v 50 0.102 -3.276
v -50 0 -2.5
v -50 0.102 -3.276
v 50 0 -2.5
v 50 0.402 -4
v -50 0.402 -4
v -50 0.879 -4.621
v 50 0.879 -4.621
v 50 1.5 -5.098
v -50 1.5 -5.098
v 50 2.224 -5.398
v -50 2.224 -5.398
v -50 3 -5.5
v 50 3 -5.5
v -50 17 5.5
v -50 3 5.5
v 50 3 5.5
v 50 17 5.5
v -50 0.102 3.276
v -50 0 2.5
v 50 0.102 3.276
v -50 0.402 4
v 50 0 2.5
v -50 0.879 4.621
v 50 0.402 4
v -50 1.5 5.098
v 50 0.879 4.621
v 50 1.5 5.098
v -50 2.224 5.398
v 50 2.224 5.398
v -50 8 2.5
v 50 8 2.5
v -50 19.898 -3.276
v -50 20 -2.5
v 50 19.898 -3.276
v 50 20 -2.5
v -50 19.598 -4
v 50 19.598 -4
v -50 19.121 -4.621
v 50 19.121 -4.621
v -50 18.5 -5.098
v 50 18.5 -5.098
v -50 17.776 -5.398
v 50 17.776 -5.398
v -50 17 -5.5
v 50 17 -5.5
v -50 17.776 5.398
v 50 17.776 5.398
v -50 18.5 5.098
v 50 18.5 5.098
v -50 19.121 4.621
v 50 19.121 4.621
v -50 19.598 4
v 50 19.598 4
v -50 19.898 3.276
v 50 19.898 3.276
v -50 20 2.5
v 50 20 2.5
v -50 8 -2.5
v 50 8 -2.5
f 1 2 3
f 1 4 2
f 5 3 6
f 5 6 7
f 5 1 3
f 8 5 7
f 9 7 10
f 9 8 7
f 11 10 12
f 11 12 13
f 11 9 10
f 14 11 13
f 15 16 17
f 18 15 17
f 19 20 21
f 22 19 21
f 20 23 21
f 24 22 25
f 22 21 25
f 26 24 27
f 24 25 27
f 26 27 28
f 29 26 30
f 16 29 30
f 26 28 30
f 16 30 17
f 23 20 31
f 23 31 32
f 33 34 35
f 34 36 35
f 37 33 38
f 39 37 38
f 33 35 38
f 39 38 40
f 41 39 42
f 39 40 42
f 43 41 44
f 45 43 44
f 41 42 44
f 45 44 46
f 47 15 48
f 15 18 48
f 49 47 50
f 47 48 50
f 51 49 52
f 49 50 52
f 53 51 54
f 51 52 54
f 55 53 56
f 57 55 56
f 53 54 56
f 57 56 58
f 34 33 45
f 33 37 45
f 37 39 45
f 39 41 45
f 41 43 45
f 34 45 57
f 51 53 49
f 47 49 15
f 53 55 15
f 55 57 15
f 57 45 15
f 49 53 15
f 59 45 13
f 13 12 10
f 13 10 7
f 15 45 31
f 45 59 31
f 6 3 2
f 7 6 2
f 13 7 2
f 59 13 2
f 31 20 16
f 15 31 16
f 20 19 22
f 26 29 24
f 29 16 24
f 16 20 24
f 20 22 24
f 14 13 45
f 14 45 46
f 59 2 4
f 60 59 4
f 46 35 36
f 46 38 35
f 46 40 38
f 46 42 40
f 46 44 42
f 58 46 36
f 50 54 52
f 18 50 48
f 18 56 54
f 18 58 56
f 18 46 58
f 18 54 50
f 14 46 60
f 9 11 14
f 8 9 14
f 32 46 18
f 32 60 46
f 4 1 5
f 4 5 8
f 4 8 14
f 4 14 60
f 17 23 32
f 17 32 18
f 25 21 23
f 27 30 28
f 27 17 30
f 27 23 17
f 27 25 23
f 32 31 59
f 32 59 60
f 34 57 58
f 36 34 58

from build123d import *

# Parameters (mm, degrees)
F0_W     = 100
F0_H     = 11
F1_DEPTH = 20
F2_W     = 100
F2_H     = 5
F3_DEPTH = 8
F4_R     = 2.99999


# Not quite as in the source:
# - a fillet or chamfer is up to 0.001 mm smaller than in the source, because OpenCascade refuses the exact size


with BuildPart() as f1:
    # F0 (on Front) → F1 (new body)
    with BuildSketch(Plane.XZ):
        Rectangle(F0_W, F0_H)
    extrude(amount=-F1_DEPTH)

    # F2 (on face) → F3 (cut)
    with BuildSketch(Plane.XZ):
        Rectangle(F2_W, F2_H)
    extrude(amount=-F3_DEPTH, mode=Mode.SUBTRACT)

    # F4 (radius 3 in the source; OpenCascade refuses exactly that, so slightly less here)
    f4_edges = [f1.edges().sort_by_distance(p)[0] for p in [
        (0, 20, 5.5),
        (0, 20, -5.5),
        (0, 0, 5.5),
        (0, 0, -5.5),
    ]]
    fillet(f4_edges, radius=F4_R)


solid = f1.part
